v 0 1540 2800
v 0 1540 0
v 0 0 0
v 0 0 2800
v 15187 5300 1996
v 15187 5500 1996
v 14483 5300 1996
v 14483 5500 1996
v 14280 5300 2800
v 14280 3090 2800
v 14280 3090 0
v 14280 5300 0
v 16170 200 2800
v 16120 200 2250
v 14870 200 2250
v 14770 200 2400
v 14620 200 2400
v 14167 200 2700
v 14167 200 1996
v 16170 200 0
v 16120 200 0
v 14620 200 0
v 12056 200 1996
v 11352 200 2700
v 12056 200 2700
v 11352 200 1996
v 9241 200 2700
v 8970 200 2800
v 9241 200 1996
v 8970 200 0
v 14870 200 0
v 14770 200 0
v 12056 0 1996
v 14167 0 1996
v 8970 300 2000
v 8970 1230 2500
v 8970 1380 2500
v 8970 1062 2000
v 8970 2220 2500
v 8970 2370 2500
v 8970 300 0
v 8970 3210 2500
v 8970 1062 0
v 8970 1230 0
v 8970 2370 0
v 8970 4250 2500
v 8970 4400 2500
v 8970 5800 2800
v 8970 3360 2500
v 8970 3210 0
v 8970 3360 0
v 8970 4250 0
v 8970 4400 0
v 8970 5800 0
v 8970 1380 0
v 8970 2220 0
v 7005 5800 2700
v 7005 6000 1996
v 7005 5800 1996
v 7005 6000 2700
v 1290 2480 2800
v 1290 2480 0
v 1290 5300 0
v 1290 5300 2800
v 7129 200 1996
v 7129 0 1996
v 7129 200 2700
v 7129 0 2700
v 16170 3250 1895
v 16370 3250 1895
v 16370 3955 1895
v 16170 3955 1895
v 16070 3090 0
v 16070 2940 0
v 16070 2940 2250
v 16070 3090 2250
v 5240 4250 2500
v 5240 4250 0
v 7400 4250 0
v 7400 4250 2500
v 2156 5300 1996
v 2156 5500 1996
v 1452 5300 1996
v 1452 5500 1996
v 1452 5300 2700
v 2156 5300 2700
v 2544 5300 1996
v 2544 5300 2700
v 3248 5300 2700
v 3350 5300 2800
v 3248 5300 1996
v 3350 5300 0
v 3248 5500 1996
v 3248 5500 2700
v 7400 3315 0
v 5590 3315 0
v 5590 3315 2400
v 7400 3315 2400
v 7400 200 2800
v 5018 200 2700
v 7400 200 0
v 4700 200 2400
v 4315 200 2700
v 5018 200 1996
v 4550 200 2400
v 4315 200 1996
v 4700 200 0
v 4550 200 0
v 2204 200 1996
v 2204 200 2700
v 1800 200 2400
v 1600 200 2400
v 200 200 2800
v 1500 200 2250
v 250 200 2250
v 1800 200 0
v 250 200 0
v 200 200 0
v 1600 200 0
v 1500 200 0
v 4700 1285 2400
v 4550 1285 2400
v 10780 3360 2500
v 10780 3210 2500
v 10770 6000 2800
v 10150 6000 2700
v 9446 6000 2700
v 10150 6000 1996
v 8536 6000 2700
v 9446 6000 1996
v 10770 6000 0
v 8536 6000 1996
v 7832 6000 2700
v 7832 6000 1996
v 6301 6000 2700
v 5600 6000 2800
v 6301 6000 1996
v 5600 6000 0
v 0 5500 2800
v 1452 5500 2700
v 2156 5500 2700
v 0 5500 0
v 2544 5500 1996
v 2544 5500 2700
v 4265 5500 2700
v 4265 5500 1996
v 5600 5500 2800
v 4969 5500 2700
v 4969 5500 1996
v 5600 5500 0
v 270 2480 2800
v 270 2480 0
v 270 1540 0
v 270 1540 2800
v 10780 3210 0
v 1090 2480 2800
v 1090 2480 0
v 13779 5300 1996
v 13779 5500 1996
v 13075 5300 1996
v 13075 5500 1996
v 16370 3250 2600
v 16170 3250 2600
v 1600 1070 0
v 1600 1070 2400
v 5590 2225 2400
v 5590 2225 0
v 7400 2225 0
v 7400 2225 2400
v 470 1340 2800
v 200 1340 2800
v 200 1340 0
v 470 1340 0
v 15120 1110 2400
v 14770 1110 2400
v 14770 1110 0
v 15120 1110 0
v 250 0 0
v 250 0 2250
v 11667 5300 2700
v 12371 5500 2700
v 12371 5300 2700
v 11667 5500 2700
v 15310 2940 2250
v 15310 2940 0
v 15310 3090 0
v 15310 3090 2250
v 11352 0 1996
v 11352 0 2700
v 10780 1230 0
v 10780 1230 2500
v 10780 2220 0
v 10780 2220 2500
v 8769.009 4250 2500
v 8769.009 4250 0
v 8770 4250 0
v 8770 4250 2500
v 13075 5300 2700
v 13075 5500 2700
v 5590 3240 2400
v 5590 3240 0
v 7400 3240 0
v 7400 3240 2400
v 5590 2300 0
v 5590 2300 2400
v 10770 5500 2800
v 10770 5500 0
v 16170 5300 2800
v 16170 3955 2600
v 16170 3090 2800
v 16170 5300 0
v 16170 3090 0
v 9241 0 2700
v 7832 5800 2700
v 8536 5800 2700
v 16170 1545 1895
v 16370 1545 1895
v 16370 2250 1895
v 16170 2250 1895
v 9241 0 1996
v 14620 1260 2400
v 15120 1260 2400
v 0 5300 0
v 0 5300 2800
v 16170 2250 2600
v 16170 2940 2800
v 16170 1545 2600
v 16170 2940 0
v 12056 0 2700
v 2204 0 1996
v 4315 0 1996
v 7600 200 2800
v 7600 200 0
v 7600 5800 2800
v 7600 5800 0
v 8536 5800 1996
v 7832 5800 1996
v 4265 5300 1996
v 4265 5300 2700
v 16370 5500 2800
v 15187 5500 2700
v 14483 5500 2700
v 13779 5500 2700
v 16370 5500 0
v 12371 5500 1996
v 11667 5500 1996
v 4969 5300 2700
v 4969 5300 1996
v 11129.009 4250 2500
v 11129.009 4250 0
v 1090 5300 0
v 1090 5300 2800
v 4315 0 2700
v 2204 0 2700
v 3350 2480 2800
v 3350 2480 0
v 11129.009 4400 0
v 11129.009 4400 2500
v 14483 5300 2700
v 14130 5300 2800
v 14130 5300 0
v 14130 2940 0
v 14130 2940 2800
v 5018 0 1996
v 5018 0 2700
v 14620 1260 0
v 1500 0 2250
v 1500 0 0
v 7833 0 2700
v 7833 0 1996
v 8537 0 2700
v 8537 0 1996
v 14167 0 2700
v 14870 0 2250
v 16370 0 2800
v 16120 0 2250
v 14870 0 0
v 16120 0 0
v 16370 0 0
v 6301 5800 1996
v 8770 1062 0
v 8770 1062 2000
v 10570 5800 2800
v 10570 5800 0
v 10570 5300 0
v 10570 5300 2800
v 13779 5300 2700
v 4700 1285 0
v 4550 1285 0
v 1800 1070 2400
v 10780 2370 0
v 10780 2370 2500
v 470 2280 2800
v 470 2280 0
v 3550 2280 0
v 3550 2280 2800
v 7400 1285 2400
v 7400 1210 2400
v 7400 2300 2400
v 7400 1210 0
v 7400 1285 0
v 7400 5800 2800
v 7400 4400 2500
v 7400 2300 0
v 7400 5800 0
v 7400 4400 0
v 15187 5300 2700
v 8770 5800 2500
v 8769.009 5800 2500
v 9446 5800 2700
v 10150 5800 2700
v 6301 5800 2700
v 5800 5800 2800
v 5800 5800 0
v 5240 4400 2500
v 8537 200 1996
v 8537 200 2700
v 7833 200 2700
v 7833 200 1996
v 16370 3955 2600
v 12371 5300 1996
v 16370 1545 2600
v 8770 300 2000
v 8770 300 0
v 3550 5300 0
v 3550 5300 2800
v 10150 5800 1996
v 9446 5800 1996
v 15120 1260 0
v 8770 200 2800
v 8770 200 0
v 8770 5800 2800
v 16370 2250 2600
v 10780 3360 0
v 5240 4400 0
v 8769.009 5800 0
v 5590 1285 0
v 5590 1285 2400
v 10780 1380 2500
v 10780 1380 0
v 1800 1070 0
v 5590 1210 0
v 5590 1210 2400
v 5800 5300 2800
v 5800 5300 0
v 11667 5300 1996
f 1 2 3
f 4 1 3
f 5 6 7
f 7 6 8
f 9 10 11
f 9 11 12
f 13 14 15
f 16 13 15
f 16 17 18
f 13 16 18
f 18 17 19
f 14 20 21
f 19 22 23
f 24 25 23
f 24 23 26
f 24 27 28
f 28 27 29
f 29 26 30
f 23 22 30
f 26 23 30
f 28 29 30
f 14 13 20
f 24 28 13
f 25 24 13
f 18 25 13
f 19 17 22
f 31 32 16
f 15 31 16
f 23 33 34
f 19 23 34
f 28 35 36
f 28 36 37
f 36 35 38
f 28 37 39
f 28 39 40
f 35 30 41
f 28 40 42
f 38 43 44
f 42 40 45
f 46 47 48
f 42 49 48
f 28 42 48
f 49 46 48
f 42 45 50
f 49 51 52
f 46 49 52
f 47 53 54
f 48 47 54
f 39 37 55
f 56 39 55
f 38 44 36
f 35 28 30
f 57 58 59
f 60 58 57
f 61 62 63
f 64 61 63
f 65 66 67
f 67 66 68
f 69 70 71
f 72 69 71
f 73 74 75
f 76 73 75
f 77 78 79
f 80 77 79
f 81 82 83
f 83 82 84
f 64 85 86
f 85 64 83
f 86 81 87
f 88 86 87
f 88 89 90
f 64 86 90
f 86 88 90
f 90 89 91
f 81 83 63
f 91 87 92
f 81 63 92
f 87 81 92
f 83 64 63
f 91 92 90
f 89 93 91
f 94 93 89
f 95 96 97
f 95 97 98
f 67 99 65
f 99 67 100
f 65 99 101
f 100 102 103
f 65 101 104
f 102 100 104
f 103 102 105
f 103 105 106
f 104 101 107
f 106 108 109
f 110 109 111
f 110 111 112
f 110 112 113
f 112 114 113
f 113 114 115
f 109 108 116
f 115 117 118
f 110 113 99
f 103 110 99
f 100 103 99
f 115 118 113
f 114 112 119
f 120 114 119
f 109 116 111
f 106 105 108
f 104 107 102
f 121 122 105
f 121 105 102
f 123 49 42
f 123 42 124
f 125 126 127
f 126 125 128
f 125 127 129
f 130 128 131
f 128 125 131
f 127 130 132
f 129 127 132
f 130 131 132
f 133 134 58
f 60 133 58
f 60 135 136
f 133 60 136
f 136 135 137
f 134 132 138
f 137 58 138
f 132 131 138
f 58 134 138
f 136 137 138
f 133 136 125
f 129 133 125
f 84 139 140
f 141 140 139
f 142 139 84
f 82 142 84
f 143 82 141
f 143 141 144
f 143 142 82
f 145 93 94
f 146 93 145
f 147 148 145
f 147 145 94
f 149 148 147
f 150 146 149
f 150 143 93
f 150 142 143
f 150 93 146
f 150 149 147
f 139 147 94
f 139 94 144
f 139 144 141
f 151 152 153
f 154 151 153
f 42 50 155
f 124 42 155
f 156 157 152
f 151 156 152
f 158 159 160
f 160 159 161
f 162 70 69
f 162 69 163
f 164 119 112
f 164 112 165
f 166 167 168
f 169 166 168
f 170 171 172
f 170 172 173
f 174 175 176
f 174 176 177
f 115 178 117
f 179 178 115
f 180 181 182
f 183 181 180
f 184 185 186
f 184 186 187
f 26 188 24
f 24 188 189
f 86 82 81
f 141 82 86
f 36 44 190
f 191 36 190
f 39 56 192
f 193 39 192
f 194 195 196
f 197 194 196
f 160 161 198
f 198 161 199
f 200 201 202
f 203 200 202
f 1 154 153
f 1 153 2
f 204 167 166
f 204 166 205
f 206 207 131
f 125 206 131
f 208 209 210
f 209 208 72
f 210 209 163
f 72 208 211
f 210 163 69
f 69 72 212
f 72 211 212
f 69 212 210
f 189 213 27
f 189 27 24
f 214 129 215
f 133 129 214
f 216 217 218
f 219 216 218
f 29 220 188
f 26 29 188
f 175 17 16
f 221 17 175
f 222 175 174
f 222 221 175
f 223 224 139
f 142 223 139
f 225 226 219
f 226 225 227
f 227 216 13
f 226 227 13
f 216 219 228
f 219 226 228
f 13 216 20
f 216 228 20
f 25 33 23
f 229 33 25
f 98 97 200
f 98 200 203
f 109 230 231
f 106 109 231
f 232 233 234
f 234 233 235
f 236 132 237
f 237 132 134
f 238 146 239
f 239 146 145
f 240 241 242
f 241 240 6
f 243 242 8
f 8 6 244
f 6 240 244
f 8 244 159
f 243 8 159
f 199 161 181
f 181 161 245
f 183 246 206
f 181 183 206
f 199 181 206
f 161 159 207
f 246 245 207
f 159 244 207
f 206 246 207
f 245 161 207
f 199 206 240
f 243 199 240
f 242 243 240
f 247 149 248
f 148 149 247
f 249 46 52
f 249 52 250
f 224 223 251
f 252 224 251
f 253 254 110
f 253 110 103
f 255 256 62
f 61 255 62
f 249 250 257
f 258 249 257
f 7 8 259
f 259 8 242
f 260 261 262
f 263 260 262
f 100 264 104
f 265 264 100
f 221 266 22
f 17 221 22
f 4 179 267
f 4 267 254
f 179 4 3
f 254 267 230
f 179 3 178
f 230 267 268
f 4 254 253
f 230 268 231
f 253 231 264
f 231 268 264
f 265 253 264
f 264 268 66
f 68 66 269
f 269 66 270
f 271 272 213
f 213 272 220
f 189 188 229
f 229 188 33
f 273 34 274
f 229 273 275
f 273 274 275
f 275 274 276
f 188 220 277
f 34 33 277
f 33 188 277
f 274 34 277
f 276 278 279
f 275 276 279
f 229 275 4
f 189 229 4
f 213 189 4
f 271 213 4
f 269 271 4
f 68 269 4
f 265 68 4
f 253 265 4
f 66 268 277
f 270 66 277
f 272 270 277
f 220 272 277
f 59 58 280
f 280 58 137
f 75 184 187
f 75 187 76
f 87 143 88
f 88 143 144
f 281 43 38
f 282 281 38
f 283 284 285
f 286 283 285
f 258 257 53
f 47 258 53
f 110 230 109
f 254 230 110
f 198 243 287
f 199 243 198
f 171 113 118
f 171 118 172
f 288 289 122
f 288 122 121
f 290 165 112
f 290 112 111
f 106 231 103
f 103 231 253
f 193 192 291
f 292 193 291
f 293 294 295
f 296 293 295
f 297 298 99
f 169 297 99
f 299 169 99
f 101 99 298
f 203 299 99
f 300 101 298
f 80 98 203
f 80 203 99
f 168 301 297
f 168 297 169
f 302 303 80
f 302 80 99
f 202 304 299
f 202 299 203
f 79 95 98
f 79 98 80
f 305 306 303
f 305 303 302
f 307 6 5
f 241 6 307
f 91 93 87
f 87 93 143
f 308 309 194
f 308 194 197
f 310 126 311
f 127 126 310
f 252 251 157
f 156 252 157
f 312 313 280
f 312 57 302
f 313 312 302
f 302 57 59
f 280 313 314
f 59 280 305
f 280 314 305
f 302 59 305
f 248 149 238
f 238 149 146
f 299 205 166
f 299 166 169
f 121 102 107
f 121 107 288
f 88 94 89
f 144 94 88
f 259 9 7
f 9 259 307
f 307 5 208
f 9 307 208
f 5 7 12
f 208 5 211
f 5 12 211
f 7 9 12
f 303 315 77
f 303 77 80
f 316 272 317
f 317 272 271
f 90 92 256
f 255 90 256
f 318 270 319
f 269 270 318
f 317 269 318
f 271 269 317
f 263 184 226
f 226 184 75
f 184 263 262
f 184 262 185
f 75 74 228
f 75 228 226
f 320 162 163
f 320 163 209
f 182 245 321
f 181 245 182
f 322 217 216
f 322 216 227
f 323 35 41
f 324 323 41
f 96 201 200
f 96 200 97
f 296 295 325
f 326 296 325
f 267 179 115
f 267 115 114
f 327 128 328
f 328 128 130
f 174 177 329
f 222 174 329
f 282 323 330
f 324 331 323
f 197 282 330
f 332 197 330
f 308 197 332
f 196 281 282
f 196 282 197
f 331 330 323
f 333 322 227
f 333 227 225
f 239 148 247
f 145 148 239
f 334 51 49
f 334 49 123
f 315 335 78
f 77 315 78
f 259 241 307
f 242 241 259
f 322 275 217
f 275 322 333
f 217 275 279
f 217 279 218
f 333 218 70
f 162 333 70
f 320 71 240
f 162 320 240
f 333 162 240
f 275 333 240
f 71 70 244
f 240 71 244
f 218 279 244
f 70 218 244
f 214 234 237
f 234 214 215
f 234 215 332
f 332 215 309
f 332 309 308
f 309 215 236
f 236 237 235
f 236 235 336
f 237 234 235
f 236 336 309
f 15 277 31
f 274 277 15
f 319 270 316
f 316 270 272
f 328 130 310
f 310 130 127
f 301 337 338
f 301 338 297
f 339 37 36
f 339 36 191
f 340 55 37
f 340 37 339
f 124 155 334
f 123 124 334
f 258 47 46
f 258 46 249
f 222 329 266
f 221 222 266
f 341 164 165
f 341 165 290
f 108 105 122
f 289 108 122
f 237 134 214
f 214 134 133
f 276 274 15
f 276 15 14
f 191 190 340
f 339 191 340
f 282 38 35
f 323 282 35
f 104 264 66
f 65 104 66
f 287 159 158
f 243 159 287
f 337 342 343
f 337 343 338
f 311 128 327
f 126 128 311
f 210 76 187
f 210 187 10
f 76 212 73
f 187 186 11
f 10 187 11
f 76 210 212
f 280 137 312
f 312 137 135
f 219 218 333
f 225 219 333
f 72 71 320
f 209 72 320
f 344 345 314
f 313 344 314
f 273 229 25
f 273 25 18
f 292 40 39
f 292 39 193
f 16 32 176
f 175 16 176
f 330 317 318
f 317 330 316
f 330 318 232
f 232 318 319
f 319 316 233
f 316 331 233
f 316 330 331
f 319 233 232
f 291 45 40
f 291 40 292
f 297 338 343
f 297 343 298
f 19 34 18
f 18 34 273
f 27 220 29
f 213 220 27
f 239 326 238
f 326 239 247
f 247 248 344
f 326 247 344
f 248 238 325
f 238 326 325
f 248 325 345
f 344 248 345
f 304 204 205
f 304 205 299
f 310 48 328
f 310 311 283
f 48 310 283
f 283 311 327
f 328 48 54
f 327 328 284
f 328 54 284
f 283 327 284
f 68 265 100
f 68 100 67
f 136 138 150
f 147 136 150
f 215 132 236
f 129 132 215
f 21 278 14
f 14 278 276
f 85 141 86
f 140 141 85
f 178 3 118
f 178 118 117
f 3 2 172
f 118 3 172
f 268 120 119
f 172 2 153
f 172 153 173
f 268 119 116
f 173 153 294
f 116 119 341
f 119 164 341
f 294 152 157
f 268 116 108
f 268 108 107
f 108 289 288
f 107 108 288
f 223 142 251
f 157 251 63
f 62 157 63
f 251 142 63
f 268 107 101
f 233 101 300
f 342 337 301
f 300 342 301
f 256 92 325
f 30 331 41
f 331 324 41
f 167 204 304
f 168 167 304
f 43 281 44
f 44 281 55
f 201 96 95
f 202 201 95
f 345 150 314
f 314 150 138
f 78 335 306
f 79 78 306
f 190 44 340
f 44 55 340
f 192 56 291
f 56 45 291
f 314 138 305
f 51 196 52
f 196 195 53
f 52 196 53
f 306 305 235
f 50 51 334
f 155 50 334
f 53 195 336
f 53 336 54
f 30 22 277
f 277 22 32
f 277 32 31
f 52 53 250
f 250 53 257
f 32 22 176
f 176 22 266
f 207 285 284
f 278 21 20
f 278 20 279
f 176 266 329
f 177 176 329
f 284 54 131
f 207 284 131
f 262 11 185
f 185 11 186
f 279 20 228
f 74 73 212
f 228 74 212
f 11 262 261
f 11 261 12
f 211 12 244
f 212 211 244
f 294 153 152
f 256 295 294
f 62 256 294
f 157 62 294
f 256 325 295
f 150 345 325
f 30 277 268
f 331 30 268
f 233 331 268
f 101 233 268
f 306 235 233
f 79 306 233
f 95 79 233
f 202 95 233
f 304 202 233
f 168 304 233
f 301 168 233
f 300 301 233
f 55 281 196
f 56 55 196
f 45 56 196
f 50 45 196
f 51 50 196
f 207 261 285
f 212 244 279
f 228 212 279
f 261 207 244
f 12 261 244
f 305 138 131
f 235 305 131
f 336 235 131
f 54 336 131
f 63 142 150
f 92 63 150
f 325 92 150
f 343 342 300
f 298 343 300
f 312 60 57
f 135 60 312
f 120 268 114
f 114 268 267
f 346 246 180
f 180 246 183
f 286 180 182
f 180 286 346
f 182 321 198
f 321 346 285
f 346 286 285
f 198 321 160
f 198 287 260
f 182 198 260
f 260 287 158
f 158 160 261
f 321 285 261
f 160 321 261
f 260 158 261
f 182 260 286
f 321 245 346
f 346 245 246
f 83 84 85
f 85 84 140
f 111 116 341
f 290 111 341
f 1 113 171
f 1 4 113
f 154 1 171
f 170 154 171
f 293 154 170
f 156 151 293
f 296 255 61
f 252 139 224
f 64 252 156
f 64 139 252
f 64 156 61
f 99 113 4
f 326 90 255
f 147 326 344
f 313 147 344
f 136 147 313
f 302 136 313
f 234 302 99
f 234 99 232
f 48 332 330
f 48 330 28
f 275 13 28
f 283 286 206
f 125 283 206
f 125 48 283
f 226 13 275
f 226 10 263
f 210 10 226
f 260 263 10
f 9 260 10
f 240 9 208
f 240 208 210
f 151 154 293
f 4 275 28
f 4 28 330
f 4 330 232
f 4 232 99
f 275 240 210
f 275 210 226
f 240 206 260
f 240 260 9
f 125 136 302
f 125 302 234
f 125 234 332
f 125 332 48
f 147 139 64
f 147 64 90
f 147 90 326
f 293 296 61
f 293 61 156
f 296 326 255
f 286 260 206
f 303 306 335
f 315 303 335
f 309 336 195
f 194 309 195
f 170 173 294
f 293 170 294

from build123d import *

# Parameters (mm, degrees)
F1_DEPTH  = 2800
F2_W      = 1250
F2_H      = 2250
F3_DEPTH  = 200
F4_W      = 1250
F4_H      = 2250
F5_DEPTH  = 200
F7_DEPTH  = 2800
F8_W      = 200
F8_H      = 5600
F10_DEPTH = 2800
F9_W      = 200
F9_H      = 5600
F11_DEPTH = 2800
F14_DEPTH = 2500
F16_DEPTH = 2800
F17_W     = 2111
F17_H     = 704
F17_W_2   = 704
F18_DEPTH = 200
F19_DEPTH = 2500
F20_W     = 704
F20_H     = 704
F21_DEPTH = 200
F22_W     = 704
F22_H     = 704
F23_DEPTH = 200
F24_W     = 704
F24_H     = 704
F25_DEPTH = 200
F28_W     = 760
F28_H     = 2250
F29_DEPTH = 150
F30_W     = 705
F30_H     = 705
F31_DEPTH = 200
F32_W     = 1810
F32_H     = 150
F33_DEPTH = 2500
F35_DEPTH = 200
F36_W     = 200
F36_H     = 870
F37_DEPTH = 2400
F38_W     = 150
F38_H     = 1085
F39_DEPTH = 2400
F40_W     = 1810
F40_H     = 75
F41_DEPTH = 2400
F42_W     = 1810
F42_H     = 75
F43_DEPTH = 2400
F45_DEPTH = 2400
F46_W     = 1090
F46_H     = 200
F47_DEPTH = 2800


with BuildPart() as f1:
    # F0 (on Top) → F1 (new body)
    with BuildSketch(Plane.XY):
        Polygon((0, 200), (0, 0), (16370, 0), (16370, 5500), (10770, 5500), (10770, 6000), (5600, 6000), (5600, 5500), (1090, 5500), (1090, 5300), (1090, 2480), (270, 2480), (270, 1540), (0, 1540), align=None)
        Polygon((1290, 5300), (5800, 5300), (5800, 5800), (10570, 5800), (10570, 5300), (16170, 5300), (16170, 200), (200, 200), (200, 1340), (470, 1340), (470, 2280), (936.407268, 2280), (1290, 2280), align=None, mode=Mode.SUBTRACT)
    extrude(amount=F1_DEPTH)

    # F2 (on face) → F3 (cut)
    with BuildSketch(Plane.XZ):
        with Locations((875, 1125)):
            Rectangle(F2_W, F2_H)
    extrude(amount=-F3_DEPTH, mode=Mode.SUBTRACT)

    # F4 (on face) → F5 (cut)
    with BuildSketch(Plane.XZ):
        with Locations((15495, 1125)):
            Rectangle(F4_W, F4_H)
    extrude(amount=-F5_DEPTH, mode=Mode.SUBTRACT)

    # F6 (on Top) → F7 (join)
    with BuildSketch(Plane.XY):
        Polygon((1290, 2480), (1290, 2280), (3550, 2280), (3550, 5300), (3350, 5300), (3350, 2480), align=None)
    extrude(amount=F7_DEPTH)

    # F8 (on Top) → F10 (join)
    with BuildSketch(Plane.XY):
        with Locations((7500, 3000)):
            Rectangle(F8_W, F8_H)
    extrude(amount=F10_DEPTH)

    # F9 (on Top) → F11 (join)
    with BuildSketch(Plane.XY):
        with Locations((8870, 3000)):
            Rectangle(F9_W, F9_H)
    extrude(amount=F11_DEPTH)

    # F13 (on Top) → F14 (join)
    with BuildSketch(Plane.XY):
        Polygon((7600, 5800), (7400, 5800), (7400, 4400), (5240, 4400), (5240, 4250), (7600, 4250), align=None)
    extrude(amount=F14_DEPTH)

    # F15 (on Top) → F16 (join)
    with BuildSketch(Plane.XY):
        Polygon((14280, 5300), (14130, 5300), (14130, 2940), (16170, 2940), (16170, 3090), (14280, 3090), align=None)
    extrude(amount=F16_DEPTH)

    # F17 (on face) → F18 (cut)
    with BuildSketch(Plane.XZ):
        with Locations((3259.5, 2348)):
            Rectangle(F17_W, F17_H)
        with Locations((6073.5, 2348)):
            Rectangle(F17_W, F17_H)
        with Locations((8185, 2348)):
            Rectangle(F17_W_2, F17_H)
        with Locations((10296.5, 2348)):
            Rectangle(F17_W, F17_H)
        with Locations((13111.5, 2348)):
            Rectangle(F17_W, F17_H)
    extrude(amount=-F18_DEPTH, mode=Mode.SUBTRACT)

    # F12 (on Top) → F19 (join)
    with BuildSketch(Plane.XY):
        Polygon((8969.008636, 4400), (8969.008636, 5800), (8769.008636, 5800), (8769.008636, 4250), (11129.008636, 4250), (11129.008636, 4400), align=None)
    extrude(amount=F19_DEPTH)

    # F20 (on face) → F21 (cut)
    with BuildSketch(Plane(origin=(0, 5500, 0), x_dir=(-1, 0, 0), z_dir=(0, 1, 0))):
        with Locations((-14835, 2348)):
            Rectangle(F20_W, F20_H)
        with Locations((-13427, 2348)):
            Rectangle(F20_W, F20_H)
        with Locations((-12019, 2348)):
            Rectangle(F20_W, F20_H)
    extrude(amount=-F21_DEPTH, mode=Mode.SUBTRACT)

    # F22 (on face) → F23 (cut)
    with BuildSketch(Plane(origin=(0, 6000, 0), x_dir=(-1, 0, 0), z_dir=(0, 1, 0))):
        with Locations((-9798, 2348)):
            Rectangle(F22_W, F22_H)
        with Locations((-8184, 2348)):
            Rectangle(F22_W, F22_H)
        with Locations((-6653, 2348)):
            Rectangle(F22_W, F22_H)
    extrude(amount=-F23_DEPTH, mode=Mode.SUBTRACT)

    # F24 (on face) → F25 (cut)
    with BuildSketch(Plane(origin=(0, 5500, 0), x_dir=(-1, 0, 0), z_dir=(0, 1, 0))):
        with Locations((-4617, 2348)):
            Rectangle(F24_W, F24_H)
        with Locations((-2896, 2348)):
            Rectangle(F24_W, F24_H)
        with Locations((-1804, 2348)):
            Rectangle(F24_W, F24_H)
    extrude(amount=-F25_DEPTH, mode=Mode.SUBTRACT)

    # F28 (on face) → F29 (cut)
    with BuildSketch(Plane.XZ.offset(-2940)):
        with Locations((15690, 1125)):
            Rectangle(F28_W, F28_H)
    extrude(amount=-F29_DEPTH, mode=Mode.SUBTRACT)

    # F30 (on face) → F31 (cut)
    with BuildSketch(Plane.YZ.offset(16370)):
        with Locations((1897.5, 2247.5)):
            Rectangle(F30_W, F30_H)
        with Locations((3602.5, 2247.5)):
            Rectangle(F30_W, F30_H)
    extrude(amount=-F31_DEPTH, mode=Mode.SUBTRACT)

    # F32 (on Top) → F33 (join)
    with BuildSketch(Plane.XY):
        Polygon((8970, 3360), (8970, 5800), (8969.008636, 5800), (8770, 5800), (8770, 1230), (8970, 1230), (8970, 1380), (8970, 2220), (8970, 2370), (8970, 3210), align=None)
        with Locations((9875, 3285)):
            Rectangle(F32_W, F32_H)
        with Locations((9875, 2295)):
            Rectangle(F32_W, F32_H)
        with Locations((9875, 1305)):
            Rectangle(F32_W, F32_H)
    extrude(amount=F33_DEPTH)

    # F34 (on face) → F35 (cut)
    with BuildSketch(Plane.YZ.offset(8970)):
        Polygon((300, 2000), (300, 0), (962, 0), (1062, 0), (1062, 2000), align=None)
    extrude(amount=-F35_DEPTH, mode=Mode.SUBTRACT)

    # F36 (on Top) → F37 (join)
    with BuildSketch(Plane.XY):
        with Locations((1700, 635)):
            Rectangle(F36_W, F36_H)
    extrude(amount=F37_DEPTH)

    # F38 (on Top) → F39 (join)
    with BuildSketch(Plane.XY):
        with Locations((4625, 742.5)):
            Rectangle(F38_W, F38_H)
    extrude(amount=F39_DEPTH)

    # F40 (on Top) → F41 (join)
    with BuildSketch(Plane.XY):
        with Locations((6495, 1247.5)):
            Rectangle(F40_W, F40_H)
    extrude(amount=F41_DEPTH)

    # F42 (on Top) → F43 (join)
    with BuildSketch(Plane.XY):
        with Locations((6495, 2262.5)):
            Rectangle(F42_W, F42_H)
        with Locations((6495, 3277.5)):
            Rectangle(F42_W, F42_H)
    extrude(amount=F43_DEPTH)

    # F44 (on Top) → F45 (join)
    with BuildSketch(Plane.XY):
        Polygon((14620, 200), (14770, 200), (14770, 1110), (15120, 1110), (15120, 1260), (14620, 1260), align=None)
    extrude(amount=F45_DEPTH)

    # F46 (on Top) → F47 (join)
    with BuildSketch(Plane.XY):
        with Locations((545, 5400)):
            Rectangle(F46_W, F46_H)
    extrude(amount=F47_DEPTH)


solid = f1.part
